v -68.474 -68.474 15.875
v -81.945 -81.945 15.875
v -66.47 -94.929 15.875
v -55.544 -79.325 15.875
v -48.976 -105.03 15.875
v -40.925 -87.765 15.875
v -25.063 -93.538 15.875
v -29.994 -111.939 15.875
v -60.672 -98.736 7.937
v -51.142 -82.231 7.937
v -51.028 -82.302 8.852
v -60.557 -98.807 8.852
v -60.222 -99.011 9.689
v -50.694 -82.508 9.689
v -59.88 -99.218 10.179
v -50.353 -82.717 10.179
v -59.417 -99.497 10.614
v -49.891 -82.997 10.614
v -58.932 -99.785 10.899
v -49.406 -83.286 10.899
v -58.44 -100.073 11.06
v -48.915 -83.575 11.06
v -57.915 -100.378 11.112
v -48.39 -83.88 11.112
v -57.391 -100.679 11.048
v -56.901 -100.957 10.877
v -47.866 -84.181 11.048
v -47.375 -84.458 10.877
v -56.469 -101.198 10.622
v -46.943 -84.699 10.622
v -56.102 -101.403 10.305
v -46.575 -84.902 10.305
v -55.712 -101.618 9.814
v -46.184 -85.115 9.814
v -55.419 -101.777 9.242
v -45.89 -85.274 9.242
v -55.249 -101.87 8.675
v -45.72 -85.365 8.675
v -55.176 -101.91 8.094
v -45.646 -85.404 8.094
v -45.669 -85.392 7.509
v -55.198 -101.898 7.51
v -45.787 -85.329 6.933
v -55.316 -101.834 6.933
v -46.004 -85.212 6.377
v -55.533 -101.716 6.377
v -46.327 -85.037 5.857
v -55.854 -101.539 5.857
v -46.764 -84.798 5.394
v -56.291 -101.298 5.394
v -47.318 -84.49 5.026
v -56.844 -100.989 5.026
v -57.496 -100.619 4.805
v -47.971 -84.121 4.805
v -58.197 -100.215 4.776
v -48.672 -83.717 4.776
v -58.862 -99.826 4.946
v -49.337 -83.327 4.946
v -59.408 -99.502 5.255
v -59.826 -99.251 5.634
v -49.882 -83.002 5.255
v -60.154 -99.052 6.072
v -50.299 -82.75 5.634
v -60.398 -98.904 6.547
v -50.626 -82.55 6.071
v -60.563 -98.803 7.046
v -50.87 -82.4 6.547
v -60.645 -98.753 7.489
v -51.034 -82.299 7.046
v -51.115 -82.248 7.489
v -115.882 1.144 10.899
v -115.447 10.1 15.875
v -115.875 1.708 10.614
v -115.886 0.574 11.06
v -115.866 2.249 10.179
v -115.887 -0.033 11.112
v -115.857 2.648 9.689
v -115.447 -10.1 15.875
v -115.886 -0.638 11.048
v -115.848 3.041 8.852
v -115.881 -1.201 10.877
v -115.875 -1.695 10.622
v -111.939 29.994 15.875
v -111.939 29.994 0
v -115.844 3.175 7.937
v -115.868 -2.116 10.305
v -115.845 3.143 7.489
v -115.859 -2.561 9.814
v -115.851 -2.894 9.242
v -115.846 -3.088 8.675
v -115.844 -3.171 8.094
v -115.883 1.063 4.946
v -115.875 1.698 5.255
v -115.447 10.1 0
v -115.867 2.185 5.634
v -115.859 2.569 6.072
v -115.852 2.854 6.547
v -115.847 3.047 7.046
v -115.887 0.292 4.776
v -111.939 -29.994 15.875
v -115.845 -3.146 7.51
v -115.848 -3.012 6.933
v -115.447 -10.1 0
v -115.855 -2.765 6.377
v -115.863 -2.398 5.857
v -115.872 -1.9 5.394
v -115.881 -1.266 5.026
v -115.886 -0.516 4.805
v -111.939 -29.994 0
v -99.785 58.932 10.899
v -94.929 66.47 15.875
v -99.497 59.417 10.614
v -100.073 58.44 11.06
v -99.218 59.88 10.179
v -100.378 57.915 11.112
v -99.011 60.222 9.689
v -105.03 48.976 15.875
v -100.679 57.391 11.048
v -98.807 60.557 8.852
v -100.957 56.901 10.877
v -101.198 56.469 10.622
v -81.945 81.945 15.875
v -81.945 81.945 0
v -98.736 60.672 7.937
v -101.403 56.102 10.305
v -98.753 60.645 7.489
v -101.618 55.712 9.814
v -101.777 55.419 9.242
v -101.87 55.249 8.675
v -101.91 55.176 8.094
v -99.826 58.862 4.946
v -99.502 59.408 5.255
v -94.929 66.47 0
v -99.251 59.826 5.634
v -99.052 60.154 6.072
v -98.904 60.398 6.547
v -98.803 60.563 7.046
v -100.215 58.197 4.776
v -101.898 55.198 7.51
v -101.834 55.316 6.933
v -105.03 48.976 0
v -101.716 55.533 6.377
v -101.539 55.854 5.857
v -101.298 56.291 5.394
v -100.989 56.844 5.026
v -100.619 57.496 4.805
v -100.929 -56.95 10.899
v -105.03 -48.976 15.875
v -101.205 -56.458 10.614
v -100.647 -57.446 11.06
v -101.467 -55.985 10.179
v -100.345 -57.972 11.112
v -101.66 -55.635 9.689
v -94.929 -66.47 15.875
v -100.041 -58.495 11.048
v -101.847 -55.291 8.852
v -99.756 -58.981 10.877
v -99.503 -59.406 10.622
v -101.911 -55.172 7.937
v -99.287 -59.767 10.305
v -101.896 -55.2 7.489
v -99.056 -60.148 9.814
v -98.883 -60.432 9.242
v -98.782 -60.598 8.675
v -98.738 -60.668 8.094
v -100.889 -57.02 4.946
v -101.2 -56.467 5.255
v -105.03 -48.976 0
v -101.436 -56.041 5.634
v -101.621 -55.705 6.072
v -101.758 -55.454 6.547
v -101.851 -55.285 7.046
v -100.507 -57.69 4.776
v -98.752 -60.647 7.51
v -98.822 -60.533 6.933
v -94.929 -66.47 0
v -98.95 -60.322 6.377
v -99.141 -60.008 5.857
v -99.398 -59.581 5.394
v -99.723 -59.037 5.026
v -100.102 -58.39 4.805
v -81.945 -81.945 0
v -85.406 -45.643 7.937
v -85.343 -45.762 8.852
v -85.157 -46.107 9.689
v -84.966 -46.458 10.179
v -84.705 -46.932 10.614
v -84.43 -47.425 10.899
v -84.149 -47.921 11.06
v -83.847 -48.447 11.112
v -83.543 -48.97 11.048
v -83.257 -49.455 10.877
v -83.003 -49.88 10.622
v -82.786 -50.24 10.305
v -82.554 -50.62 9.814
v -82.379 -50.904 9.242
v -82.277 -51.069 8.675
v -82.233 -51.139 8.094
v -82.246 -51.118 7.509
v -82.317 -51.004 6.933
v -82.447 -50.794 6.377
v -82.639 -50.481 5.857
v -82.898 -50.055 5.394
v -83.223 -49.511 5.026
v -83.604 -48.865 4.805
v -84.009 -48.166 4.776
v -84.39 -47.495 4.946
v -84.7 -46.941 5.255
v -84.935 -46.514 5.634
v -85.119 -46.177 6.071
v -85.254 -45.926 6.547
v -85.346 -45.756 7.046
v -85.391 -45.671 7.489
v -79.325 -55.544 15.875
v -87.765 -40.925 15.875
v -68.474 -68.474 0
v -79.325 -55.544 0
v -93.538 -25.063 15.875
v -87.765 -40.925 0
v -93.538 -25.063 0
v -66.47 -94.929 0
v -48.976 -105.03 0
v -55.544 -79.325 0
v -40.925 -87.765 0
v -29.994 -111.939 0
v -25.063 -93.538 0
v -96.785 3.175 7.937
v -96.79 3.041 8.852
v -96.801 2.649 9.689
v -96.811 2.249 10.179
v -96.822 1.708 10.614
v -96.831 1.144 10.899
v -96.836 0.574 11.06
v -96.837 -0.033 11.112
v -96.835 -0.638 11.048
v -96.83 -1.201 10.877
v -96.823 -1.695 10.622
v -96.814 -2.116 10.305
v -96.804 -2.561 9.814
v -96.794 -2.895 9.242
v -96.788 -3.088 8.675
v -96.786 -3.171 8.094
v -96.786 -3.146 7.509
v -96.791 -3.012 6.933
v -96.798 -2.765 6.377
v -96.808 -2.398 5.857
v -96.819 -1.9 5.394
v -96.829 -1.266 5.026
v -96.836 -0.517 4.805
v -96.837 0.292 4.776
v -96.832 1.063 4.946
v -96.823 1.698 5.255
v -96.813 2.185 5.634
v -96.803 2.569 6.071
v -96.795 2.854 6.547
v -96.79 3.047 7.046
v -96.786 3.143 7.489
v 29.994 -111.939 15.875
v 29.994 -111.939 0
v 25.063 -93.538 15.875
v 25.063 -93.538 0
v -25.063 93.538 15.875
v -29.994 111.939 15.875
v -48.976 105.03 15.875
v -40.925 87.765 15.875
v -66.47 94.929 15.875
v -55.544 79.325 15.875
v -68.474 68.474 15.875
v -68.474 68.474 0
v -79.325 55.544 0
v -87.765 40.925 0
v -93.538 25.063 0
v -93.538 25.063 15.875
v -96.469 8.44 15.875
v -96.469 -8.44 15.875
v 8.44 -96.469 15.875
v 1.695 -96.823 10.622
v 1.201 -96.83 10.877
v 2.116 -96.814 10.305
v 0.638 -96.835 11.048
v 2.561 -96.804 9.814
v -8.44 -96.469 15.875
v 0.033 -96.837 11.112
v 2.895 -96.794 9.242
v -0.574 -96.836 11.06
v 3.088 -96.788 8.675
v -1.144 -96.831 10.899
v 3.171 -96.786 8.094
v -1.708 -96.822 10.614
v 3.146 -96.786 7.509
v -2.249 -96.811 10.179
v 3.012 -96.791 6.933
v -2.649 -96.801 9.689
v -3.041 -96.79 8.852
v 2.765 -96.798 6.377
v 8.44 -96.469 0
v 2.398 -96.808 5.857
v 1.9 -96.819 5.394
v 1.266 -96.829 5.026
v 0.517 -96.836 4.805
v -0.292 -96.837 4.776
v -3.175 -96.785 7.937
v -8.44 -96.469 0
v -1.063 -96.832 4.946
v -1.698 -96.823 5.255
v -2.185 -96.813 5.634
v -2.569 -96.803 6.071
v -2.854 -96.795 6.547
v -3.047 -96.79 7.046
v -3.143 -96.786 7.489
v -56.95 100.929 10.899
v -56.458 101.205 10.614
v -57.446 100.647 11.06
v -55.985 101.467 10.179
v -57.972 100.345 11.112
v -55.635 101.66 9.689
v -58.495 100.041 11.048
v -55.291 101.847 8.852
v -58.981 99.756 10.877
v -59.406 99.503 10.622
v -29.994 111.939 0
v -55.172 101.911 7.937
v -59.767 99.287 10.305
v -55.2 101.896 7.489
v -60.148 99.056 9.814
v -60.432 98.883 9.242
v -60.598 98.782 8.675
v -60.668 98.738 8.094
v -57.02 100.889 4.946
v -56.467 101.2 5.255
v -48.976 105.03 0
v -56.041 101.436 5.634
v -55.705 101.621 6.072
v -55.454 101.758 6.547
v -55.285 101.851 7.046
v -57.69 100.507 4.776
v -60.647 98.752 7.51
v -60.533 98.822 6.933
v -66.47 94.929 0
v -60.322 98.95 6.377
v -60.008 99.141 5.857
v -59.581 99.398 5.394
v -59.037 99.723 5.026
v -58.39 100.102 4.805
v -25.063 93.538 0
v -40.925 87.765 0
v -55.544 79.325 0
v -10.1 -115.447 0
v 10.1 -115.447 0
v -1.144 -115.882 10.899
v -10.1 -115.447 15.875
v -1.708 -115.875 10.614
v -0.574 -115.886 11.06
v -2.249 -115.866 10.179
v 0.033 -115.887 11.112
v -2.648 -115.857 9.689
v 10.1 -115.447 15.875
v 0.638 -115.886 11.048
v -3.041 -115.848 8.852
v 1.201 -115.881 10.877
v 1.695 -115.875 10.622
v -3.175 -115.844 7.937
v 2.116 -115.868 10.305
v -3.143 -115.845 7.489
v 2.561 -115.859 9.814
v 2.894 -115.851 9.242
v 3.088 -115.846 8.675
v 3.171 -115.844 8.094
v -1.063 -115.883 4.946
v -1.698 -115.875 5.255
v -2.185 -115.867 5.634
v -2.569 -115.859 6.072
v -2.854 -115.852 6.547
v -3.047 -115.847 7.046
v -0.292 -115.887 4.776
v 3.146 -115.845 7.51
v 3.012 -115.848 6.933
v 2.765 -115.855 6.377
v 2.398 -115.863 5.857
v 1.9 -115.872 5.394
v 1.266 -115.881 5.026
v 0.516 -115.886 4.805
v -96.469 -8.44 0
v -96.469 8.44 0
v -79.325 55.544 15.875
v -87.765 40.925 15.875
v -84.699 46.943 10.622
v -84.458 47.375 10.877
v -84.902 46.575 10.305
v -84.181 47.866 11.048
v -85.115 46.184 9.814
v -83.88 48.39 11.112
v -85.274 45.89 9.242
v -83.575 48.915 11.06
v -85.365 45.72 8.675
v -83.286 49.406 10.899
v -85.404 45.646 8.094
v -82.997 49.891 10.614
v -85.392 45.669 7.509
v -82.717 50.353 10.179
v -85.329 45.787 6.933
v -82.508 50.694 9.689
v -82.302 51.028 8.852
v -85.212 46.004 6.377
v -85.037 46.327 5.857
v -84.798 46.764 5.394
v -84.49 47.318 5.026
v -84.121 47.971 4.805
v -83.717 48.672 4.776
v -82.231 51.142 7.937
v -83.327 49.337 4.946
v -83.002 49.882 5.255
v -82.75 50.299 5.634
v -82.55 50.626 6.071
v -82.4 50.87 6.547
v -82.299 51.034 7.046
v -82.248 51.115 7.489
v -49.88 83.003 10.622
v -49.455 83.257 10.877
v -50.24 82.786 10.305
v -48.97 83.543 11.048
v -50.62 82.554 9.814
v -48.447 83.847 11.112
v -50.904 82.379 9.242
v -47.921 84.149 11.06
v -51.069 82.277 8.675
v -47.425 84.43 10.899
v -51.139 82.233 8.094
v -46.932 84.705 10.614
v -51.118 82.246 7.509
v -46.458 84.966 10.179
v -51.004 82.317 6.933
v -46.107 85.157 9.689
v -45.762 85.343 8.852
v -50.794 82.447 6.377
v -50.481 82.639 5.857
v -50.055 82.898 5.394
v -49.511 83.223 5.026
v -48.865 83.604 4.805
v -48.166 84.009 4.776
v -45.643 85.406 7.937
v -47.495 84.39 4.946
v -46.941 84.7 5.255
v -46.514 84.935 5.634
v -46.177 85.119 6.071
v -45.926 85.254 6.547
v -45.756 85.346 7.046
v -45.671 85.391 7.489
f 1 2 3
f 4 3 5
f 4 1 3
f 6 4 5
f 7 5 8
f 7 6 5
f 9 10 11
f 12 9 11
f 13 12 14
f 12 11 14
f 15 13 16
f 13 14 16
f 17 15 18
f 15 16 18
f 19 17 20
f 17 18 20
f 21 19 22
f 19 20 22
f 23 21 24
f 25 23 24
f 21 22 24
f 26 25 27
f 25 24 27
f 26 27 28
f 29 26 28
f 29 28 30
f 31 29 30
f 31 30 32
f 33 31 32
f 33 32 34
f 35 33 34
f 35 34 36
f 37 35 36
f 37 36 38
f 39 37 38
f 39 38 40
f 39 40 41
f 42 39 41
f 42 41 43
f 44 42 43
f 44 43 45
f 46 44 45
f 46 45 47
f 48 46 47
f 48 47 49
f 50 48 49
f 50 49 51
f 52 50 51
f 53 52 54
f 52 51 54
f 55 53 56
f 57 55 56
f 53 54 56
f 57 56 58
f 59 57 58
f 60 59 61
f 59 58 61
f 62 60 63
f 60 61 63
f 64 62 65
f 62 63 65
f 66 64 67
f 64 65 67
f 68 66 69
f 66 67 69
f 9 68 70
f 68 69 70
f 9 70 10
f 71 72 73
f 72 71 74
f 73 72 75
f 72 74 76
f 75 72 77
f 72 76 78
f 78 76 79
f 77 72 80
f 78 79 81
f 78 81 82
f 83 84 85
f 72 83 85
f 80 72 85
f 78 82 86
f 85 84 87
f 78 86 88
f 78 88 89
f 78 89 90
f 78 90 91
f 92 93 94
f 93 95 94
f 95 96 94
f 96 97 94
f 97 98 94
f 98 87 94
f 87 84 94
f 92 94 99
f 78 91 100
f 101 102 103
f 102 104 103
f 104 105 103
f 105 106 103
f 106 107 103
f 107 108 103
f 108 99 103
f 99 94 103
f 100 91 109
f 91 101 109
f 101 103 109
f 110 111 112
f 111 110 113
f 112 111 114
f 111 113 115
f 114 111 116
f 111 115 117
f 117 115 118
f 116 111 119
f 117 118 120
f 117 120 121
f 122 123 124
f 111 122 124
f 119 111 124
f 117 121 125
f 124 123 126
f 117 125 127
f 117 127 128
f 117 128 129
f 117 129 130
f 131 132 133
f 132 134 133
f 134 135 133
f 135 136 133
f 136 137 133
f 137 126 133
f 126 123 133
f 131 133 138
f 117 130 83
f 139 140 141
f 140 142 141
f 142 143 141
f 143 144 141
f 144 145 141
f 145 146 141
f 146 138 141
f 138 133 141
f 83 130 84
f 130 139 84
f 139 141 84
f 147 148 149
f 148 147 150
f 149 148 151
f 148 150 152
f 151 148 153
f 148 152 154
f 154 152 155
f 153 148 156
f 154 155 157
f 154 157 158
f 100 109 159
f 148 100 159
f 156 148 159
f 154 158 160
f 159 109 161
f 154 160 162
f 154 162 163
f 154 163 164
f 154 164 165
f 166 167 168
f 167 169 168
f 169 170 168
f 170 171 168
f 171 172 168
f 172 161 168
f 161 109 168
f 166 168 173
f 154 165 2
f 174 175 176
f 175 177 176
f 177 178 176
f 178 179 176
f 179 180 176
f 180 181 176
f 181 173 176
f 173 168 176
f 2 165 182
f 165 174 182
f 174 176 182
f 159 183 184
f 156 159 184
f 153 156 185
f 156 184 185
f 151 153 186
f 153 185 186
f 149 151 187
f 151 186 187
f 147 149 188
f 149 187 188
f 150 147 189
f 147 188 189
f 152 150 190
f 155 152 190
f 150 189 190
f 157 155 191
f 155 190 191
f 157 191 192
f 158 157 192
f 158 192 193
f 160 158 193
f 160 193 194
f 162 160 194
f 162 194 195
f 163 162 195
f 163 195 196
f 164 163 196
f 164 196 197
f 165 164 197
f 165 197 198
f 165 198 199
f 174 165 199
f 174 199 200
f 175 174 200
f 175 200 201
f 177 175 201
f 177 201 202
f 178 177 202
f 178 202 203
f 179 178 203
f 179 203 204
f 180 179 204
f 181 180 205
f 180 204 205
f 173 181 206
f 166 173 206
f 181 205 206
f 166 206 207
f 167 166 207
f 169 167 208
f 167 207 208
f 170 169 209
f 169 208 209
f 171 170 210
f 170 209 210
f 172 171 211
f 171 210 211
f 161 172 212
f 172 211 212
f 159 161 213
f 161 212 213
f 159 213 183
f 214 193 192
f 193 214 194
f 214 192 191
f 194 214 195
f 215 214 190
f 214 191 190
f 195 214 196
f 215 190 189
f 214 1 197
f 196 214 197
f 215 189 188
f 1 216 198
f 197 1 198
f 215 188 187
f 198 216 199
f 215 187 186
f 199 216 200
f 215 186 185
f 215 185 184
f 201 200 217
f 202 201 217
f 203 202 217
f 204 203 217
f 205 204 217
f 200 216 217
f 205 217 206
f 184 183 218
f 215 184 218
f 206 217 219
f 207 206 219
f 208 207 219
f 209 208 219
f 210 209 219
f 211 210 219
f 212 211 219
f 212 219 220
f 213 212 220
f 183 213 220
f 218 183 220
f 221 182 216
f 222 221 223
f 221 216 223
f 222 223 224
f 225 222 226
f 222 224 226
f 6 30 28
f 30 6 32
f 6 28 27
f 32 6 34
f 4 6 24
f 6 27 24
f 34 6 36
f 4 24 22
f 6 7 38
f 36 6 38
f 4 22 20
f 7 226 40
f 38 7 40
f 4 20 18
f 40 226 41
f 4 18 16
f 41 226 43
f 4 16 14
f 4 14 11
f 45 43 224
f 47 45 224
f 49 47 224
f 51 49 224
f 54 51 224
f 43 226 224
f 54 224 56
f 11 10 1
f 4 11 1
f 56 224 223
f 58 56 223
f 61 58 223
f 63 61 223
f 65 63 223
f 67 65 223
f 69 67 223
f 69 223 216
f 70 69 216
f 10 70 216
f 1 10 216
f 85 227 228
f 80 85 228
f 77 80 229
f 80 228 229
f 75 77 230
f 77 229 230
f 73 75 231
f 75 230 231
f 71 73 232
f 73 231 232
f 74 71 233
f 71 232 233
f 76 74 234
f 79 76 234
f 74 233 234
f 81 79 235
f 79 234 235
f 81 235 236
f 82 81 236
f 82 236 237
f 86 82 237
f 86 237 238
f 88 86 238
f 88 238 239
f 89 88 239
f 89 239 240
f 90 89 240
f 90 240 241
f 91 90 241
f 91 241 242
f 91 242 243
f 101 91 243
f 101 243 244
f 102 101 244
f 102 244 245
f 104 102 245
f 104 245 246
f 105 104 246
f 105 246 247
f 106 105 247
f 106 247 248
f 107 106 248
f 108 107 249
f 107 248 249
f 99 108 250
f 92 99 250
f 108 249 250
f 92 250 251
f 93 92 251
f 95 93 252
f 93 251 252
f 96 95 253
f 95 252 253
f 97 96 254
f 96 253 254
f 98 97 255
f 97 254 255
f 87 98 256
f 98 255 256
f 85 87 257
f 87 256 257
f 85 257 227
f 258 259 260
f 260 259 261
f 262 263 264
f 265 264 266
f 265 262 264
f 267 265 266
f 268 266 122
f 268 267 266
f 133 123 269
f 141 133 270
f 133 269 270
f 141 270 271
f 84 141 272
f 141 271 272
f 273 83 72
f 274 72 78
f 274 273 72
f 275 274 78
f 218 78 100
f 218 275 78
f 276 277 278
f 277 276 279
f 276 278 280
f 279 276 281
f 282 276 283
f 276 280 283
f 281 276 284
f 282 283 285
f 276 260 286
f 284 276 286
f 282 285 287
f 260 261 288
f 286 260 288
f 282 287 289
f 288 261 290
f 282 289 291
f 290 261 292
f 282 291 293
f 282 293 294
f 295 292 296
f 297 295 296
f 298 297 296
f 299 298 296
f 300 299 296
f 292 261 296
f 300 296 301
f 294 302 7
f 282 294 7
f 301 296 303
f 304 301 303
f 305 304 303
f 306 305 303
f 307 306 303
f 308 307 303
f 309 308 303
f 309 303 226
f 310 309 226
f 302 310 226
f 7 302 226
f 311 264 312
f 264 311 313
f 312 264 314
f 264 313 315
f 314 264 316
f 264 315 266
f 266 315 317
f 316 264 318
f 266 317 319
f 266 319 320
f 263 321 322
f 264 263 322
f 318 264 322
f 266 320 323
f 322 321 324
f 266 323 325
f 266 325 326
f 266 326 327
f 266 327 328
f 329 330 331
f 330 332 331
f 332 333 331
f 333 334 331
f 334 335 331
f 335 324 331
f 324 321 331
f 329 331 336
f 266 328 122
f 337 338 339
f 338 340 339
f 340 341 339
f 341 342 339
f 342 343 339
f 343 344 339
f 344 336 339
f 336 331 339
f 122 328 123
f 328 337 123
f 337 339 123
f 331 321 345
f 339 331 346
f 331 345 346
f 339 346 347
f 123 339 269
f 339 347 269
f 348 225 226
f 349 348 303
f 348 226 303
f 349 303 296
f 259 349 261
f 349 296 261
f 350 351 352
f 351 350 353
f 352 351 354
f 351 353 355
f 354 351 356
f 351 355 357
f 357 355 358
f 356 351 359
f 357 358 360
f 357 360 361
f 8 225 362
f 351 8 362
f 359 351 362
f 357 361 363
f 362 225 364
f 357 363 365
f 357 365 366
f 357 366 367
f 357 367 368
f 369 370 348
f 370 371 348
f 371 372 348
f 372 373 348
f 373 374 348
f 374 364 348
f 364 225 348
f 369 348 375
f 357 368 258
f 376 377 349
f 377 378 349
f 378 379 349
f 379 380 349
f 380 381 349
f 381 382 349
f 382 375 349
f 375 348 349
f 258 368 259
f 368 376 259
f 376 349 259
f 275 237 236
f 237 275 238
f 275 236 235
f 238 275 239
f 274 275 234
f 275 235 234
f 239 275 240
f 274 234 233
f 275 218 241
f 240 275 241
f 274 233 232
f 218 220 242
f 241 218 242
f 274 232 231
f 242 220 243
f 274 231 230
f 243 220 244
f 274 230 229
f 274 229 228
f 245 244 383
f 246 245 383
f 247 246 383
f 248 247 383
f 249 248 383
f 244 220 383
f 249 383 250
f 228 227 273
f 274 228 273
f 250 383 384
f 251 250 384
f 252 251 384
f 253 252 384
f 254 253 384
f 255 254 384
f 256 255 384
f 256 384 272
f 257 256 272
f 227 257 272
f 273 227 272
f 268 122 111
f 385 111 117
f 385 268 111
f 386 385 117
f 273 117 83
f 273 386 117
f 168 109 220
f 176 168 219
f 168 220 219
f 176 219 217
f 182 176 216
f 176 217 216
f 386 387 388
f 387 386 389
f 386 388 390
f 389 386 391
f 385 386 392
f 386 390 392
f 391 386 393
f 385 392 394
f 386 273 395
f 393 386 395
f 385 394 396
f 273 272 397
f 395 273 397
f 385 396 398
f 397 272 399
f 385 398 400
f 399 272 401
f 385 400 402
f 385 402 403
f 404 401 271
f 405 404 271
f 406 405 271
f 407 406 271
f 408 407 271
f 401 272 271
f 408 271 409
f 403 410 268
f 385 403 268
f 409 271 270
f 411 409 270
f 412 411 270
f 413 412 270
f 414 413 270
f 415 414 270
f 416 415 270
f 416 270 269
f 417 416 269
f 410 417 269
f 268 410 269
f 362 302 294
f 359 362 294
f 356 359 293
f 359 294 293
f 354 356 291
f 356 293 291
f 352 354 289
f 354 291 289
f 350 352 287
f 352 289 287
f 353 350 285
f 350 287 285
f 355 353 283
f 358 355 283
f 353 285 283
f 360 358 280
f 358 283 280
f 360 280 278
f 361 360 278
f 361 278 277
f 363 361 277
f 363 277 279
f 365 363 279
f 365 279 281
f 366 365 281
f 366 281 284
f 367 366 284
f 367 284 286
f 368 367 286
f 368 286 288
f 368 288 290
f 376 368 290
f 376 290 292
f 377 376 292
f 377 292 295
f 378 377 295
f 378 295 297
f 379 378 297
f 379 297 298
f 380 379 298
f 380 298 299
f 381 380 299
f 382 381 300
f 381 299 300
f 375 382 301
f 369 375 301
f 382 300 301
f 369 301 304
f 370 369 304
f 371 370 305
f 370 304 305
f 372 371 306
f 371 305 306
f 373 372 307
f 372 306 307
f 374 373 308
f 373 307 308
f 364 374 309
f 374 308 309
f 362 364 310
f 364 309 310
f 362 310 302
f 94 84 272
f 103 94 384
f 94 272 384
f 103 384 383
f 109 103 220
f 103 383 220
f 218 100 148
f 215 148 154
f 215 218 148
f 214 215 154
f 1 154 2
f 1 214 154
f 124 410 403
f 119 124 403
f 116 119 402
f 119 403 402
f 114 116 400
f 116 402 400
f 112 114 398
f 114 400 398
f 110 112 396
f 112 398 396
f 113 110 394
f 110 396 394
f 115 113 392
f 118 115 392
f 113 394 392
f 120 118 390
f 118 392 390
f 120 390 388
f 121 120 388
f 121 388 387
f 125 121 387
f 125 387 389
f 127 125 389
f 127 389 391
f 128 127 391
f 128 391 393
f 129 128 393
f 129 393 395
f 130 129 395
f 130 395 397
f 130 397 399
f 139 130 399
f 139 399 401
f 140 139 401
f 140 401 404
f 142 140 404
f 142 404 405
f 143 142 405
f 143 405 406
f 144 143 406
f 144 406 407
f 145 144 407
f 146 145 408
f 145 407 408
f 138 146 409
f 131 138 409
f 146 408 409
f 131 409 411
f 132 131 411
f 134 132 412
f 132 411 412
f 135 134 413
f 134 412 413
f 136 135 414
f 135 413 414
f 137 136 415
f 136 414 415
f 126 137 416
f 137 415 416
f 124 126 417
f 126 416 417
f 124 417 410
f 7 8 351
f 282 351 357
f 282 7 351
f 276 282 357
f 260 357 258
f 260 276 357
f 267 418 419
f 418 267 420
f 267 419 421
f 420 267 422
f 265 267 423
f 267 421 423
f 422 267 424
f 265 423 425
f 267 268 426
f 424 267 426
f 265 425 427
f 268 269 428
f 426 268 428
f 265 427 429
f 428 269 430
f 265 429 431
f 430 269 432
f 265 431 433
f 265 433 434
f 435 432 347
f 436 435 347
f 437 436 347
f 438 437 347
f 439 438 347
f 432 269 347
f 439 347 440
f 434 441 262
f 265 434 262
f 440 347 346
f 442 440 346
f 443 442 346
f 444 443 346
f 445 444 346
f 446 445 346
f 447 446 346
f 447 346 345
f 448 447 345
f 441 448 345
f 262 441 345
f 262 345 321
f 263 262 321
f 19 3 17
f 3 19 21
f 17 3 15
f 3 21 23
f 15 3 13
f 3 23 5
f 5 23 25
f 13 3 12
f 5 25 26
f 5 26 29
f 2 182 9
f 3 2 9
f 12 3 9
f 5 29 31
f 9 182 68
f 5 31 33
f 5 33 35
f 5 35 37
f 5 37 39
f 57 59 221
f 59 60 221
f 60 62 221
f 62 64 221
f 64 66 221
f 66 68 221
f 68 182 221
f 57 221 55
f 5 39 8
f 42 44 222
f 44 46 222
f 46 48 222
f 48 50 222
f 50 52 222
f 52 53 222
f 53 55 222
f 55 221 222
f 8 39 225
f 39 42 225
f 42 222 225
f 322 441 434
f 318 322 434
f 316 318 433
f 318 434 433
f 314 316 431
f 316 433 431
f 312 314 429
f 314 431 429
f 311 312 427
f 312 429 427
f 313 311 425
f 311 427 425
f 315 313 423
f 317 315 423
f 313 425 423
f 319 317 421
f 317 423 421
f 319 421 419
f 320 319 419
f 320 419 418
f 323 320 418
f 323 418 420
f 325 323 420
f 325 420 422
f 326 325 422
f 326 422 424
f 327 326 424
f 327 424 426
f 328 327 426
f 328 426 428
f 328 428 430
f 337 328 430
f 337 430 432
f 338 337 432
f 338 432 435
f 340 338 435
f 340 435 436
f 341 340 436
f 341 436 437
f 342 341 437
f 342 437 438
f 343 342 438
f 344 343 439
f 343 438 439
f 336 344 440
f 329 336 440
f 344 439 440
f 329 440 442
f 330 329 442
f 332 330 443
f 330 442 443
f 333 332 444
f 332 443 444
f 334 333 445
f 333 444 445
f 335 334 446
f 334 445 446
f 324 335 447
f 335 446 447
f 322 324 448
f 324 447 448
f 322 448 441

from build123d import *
from build123d import SkipClean  # not in build123d's __all__

# Parameters (mm, degrees)
F1_DEPTH = 15.875
F4_D     = 6.35
F4_DEPTH = 63.246
F4_TIP   = 1.9077324654
F5_COUNT = 6
F5_ANGLE = 150


with BuildPart() as f1:
    # F0 (on Top) → F1 (new body)
    with BuildSketch(Plane.XY):
        with BuildLine():
            ThreePointArc((25.0633892801, -93.5378422033), (0, -96.8375), (-25.0633892801, -93.5378422033))
            Line((-25.0633892801, -93.5378422033), (-29.9938920893, -111.9387291941))
            ThreePointArc((-29.9938920893, -111.9387291941), (0, -115.8875), (29.9938920893, -111.9387291941))
            Line((29.9938920893, -111.9387291941), (25.0633892801, -93.5378422033))
        make_face()
    extrude(amount=F1_DEPTH)

    # F4
    with Locations(Plane.XZ.offset(115.8875)):
        with Locations((0, 7.9375)):
            Hole(F4_D / 2, depth=F4_DEPTH)
            with Locations((0, 0, -(F4_DEPTH + F4_TIP / 2))):  # 118° drill point
                Cone(0, F4_D / 2, F4_TIP, mode=Mode.SUBTRACT)

    # F5: F1 ×6 about axis
    f5_axis = Axis((0, 0, 0), (0, 0, -1))


with BuildPart() as f1_1:
    add(f1.part, clean=False)
    with SkipClean():  # cleaning this boolean's faces spoils the solid; the shape is the same uncleaned
        for i in range(1, F5_COUNT):
            add(f1.part.rotate(f5_axis, i * F5_ANGLE / (F5_COUNT - 1)), clean=False)


solid = f1_1.part
